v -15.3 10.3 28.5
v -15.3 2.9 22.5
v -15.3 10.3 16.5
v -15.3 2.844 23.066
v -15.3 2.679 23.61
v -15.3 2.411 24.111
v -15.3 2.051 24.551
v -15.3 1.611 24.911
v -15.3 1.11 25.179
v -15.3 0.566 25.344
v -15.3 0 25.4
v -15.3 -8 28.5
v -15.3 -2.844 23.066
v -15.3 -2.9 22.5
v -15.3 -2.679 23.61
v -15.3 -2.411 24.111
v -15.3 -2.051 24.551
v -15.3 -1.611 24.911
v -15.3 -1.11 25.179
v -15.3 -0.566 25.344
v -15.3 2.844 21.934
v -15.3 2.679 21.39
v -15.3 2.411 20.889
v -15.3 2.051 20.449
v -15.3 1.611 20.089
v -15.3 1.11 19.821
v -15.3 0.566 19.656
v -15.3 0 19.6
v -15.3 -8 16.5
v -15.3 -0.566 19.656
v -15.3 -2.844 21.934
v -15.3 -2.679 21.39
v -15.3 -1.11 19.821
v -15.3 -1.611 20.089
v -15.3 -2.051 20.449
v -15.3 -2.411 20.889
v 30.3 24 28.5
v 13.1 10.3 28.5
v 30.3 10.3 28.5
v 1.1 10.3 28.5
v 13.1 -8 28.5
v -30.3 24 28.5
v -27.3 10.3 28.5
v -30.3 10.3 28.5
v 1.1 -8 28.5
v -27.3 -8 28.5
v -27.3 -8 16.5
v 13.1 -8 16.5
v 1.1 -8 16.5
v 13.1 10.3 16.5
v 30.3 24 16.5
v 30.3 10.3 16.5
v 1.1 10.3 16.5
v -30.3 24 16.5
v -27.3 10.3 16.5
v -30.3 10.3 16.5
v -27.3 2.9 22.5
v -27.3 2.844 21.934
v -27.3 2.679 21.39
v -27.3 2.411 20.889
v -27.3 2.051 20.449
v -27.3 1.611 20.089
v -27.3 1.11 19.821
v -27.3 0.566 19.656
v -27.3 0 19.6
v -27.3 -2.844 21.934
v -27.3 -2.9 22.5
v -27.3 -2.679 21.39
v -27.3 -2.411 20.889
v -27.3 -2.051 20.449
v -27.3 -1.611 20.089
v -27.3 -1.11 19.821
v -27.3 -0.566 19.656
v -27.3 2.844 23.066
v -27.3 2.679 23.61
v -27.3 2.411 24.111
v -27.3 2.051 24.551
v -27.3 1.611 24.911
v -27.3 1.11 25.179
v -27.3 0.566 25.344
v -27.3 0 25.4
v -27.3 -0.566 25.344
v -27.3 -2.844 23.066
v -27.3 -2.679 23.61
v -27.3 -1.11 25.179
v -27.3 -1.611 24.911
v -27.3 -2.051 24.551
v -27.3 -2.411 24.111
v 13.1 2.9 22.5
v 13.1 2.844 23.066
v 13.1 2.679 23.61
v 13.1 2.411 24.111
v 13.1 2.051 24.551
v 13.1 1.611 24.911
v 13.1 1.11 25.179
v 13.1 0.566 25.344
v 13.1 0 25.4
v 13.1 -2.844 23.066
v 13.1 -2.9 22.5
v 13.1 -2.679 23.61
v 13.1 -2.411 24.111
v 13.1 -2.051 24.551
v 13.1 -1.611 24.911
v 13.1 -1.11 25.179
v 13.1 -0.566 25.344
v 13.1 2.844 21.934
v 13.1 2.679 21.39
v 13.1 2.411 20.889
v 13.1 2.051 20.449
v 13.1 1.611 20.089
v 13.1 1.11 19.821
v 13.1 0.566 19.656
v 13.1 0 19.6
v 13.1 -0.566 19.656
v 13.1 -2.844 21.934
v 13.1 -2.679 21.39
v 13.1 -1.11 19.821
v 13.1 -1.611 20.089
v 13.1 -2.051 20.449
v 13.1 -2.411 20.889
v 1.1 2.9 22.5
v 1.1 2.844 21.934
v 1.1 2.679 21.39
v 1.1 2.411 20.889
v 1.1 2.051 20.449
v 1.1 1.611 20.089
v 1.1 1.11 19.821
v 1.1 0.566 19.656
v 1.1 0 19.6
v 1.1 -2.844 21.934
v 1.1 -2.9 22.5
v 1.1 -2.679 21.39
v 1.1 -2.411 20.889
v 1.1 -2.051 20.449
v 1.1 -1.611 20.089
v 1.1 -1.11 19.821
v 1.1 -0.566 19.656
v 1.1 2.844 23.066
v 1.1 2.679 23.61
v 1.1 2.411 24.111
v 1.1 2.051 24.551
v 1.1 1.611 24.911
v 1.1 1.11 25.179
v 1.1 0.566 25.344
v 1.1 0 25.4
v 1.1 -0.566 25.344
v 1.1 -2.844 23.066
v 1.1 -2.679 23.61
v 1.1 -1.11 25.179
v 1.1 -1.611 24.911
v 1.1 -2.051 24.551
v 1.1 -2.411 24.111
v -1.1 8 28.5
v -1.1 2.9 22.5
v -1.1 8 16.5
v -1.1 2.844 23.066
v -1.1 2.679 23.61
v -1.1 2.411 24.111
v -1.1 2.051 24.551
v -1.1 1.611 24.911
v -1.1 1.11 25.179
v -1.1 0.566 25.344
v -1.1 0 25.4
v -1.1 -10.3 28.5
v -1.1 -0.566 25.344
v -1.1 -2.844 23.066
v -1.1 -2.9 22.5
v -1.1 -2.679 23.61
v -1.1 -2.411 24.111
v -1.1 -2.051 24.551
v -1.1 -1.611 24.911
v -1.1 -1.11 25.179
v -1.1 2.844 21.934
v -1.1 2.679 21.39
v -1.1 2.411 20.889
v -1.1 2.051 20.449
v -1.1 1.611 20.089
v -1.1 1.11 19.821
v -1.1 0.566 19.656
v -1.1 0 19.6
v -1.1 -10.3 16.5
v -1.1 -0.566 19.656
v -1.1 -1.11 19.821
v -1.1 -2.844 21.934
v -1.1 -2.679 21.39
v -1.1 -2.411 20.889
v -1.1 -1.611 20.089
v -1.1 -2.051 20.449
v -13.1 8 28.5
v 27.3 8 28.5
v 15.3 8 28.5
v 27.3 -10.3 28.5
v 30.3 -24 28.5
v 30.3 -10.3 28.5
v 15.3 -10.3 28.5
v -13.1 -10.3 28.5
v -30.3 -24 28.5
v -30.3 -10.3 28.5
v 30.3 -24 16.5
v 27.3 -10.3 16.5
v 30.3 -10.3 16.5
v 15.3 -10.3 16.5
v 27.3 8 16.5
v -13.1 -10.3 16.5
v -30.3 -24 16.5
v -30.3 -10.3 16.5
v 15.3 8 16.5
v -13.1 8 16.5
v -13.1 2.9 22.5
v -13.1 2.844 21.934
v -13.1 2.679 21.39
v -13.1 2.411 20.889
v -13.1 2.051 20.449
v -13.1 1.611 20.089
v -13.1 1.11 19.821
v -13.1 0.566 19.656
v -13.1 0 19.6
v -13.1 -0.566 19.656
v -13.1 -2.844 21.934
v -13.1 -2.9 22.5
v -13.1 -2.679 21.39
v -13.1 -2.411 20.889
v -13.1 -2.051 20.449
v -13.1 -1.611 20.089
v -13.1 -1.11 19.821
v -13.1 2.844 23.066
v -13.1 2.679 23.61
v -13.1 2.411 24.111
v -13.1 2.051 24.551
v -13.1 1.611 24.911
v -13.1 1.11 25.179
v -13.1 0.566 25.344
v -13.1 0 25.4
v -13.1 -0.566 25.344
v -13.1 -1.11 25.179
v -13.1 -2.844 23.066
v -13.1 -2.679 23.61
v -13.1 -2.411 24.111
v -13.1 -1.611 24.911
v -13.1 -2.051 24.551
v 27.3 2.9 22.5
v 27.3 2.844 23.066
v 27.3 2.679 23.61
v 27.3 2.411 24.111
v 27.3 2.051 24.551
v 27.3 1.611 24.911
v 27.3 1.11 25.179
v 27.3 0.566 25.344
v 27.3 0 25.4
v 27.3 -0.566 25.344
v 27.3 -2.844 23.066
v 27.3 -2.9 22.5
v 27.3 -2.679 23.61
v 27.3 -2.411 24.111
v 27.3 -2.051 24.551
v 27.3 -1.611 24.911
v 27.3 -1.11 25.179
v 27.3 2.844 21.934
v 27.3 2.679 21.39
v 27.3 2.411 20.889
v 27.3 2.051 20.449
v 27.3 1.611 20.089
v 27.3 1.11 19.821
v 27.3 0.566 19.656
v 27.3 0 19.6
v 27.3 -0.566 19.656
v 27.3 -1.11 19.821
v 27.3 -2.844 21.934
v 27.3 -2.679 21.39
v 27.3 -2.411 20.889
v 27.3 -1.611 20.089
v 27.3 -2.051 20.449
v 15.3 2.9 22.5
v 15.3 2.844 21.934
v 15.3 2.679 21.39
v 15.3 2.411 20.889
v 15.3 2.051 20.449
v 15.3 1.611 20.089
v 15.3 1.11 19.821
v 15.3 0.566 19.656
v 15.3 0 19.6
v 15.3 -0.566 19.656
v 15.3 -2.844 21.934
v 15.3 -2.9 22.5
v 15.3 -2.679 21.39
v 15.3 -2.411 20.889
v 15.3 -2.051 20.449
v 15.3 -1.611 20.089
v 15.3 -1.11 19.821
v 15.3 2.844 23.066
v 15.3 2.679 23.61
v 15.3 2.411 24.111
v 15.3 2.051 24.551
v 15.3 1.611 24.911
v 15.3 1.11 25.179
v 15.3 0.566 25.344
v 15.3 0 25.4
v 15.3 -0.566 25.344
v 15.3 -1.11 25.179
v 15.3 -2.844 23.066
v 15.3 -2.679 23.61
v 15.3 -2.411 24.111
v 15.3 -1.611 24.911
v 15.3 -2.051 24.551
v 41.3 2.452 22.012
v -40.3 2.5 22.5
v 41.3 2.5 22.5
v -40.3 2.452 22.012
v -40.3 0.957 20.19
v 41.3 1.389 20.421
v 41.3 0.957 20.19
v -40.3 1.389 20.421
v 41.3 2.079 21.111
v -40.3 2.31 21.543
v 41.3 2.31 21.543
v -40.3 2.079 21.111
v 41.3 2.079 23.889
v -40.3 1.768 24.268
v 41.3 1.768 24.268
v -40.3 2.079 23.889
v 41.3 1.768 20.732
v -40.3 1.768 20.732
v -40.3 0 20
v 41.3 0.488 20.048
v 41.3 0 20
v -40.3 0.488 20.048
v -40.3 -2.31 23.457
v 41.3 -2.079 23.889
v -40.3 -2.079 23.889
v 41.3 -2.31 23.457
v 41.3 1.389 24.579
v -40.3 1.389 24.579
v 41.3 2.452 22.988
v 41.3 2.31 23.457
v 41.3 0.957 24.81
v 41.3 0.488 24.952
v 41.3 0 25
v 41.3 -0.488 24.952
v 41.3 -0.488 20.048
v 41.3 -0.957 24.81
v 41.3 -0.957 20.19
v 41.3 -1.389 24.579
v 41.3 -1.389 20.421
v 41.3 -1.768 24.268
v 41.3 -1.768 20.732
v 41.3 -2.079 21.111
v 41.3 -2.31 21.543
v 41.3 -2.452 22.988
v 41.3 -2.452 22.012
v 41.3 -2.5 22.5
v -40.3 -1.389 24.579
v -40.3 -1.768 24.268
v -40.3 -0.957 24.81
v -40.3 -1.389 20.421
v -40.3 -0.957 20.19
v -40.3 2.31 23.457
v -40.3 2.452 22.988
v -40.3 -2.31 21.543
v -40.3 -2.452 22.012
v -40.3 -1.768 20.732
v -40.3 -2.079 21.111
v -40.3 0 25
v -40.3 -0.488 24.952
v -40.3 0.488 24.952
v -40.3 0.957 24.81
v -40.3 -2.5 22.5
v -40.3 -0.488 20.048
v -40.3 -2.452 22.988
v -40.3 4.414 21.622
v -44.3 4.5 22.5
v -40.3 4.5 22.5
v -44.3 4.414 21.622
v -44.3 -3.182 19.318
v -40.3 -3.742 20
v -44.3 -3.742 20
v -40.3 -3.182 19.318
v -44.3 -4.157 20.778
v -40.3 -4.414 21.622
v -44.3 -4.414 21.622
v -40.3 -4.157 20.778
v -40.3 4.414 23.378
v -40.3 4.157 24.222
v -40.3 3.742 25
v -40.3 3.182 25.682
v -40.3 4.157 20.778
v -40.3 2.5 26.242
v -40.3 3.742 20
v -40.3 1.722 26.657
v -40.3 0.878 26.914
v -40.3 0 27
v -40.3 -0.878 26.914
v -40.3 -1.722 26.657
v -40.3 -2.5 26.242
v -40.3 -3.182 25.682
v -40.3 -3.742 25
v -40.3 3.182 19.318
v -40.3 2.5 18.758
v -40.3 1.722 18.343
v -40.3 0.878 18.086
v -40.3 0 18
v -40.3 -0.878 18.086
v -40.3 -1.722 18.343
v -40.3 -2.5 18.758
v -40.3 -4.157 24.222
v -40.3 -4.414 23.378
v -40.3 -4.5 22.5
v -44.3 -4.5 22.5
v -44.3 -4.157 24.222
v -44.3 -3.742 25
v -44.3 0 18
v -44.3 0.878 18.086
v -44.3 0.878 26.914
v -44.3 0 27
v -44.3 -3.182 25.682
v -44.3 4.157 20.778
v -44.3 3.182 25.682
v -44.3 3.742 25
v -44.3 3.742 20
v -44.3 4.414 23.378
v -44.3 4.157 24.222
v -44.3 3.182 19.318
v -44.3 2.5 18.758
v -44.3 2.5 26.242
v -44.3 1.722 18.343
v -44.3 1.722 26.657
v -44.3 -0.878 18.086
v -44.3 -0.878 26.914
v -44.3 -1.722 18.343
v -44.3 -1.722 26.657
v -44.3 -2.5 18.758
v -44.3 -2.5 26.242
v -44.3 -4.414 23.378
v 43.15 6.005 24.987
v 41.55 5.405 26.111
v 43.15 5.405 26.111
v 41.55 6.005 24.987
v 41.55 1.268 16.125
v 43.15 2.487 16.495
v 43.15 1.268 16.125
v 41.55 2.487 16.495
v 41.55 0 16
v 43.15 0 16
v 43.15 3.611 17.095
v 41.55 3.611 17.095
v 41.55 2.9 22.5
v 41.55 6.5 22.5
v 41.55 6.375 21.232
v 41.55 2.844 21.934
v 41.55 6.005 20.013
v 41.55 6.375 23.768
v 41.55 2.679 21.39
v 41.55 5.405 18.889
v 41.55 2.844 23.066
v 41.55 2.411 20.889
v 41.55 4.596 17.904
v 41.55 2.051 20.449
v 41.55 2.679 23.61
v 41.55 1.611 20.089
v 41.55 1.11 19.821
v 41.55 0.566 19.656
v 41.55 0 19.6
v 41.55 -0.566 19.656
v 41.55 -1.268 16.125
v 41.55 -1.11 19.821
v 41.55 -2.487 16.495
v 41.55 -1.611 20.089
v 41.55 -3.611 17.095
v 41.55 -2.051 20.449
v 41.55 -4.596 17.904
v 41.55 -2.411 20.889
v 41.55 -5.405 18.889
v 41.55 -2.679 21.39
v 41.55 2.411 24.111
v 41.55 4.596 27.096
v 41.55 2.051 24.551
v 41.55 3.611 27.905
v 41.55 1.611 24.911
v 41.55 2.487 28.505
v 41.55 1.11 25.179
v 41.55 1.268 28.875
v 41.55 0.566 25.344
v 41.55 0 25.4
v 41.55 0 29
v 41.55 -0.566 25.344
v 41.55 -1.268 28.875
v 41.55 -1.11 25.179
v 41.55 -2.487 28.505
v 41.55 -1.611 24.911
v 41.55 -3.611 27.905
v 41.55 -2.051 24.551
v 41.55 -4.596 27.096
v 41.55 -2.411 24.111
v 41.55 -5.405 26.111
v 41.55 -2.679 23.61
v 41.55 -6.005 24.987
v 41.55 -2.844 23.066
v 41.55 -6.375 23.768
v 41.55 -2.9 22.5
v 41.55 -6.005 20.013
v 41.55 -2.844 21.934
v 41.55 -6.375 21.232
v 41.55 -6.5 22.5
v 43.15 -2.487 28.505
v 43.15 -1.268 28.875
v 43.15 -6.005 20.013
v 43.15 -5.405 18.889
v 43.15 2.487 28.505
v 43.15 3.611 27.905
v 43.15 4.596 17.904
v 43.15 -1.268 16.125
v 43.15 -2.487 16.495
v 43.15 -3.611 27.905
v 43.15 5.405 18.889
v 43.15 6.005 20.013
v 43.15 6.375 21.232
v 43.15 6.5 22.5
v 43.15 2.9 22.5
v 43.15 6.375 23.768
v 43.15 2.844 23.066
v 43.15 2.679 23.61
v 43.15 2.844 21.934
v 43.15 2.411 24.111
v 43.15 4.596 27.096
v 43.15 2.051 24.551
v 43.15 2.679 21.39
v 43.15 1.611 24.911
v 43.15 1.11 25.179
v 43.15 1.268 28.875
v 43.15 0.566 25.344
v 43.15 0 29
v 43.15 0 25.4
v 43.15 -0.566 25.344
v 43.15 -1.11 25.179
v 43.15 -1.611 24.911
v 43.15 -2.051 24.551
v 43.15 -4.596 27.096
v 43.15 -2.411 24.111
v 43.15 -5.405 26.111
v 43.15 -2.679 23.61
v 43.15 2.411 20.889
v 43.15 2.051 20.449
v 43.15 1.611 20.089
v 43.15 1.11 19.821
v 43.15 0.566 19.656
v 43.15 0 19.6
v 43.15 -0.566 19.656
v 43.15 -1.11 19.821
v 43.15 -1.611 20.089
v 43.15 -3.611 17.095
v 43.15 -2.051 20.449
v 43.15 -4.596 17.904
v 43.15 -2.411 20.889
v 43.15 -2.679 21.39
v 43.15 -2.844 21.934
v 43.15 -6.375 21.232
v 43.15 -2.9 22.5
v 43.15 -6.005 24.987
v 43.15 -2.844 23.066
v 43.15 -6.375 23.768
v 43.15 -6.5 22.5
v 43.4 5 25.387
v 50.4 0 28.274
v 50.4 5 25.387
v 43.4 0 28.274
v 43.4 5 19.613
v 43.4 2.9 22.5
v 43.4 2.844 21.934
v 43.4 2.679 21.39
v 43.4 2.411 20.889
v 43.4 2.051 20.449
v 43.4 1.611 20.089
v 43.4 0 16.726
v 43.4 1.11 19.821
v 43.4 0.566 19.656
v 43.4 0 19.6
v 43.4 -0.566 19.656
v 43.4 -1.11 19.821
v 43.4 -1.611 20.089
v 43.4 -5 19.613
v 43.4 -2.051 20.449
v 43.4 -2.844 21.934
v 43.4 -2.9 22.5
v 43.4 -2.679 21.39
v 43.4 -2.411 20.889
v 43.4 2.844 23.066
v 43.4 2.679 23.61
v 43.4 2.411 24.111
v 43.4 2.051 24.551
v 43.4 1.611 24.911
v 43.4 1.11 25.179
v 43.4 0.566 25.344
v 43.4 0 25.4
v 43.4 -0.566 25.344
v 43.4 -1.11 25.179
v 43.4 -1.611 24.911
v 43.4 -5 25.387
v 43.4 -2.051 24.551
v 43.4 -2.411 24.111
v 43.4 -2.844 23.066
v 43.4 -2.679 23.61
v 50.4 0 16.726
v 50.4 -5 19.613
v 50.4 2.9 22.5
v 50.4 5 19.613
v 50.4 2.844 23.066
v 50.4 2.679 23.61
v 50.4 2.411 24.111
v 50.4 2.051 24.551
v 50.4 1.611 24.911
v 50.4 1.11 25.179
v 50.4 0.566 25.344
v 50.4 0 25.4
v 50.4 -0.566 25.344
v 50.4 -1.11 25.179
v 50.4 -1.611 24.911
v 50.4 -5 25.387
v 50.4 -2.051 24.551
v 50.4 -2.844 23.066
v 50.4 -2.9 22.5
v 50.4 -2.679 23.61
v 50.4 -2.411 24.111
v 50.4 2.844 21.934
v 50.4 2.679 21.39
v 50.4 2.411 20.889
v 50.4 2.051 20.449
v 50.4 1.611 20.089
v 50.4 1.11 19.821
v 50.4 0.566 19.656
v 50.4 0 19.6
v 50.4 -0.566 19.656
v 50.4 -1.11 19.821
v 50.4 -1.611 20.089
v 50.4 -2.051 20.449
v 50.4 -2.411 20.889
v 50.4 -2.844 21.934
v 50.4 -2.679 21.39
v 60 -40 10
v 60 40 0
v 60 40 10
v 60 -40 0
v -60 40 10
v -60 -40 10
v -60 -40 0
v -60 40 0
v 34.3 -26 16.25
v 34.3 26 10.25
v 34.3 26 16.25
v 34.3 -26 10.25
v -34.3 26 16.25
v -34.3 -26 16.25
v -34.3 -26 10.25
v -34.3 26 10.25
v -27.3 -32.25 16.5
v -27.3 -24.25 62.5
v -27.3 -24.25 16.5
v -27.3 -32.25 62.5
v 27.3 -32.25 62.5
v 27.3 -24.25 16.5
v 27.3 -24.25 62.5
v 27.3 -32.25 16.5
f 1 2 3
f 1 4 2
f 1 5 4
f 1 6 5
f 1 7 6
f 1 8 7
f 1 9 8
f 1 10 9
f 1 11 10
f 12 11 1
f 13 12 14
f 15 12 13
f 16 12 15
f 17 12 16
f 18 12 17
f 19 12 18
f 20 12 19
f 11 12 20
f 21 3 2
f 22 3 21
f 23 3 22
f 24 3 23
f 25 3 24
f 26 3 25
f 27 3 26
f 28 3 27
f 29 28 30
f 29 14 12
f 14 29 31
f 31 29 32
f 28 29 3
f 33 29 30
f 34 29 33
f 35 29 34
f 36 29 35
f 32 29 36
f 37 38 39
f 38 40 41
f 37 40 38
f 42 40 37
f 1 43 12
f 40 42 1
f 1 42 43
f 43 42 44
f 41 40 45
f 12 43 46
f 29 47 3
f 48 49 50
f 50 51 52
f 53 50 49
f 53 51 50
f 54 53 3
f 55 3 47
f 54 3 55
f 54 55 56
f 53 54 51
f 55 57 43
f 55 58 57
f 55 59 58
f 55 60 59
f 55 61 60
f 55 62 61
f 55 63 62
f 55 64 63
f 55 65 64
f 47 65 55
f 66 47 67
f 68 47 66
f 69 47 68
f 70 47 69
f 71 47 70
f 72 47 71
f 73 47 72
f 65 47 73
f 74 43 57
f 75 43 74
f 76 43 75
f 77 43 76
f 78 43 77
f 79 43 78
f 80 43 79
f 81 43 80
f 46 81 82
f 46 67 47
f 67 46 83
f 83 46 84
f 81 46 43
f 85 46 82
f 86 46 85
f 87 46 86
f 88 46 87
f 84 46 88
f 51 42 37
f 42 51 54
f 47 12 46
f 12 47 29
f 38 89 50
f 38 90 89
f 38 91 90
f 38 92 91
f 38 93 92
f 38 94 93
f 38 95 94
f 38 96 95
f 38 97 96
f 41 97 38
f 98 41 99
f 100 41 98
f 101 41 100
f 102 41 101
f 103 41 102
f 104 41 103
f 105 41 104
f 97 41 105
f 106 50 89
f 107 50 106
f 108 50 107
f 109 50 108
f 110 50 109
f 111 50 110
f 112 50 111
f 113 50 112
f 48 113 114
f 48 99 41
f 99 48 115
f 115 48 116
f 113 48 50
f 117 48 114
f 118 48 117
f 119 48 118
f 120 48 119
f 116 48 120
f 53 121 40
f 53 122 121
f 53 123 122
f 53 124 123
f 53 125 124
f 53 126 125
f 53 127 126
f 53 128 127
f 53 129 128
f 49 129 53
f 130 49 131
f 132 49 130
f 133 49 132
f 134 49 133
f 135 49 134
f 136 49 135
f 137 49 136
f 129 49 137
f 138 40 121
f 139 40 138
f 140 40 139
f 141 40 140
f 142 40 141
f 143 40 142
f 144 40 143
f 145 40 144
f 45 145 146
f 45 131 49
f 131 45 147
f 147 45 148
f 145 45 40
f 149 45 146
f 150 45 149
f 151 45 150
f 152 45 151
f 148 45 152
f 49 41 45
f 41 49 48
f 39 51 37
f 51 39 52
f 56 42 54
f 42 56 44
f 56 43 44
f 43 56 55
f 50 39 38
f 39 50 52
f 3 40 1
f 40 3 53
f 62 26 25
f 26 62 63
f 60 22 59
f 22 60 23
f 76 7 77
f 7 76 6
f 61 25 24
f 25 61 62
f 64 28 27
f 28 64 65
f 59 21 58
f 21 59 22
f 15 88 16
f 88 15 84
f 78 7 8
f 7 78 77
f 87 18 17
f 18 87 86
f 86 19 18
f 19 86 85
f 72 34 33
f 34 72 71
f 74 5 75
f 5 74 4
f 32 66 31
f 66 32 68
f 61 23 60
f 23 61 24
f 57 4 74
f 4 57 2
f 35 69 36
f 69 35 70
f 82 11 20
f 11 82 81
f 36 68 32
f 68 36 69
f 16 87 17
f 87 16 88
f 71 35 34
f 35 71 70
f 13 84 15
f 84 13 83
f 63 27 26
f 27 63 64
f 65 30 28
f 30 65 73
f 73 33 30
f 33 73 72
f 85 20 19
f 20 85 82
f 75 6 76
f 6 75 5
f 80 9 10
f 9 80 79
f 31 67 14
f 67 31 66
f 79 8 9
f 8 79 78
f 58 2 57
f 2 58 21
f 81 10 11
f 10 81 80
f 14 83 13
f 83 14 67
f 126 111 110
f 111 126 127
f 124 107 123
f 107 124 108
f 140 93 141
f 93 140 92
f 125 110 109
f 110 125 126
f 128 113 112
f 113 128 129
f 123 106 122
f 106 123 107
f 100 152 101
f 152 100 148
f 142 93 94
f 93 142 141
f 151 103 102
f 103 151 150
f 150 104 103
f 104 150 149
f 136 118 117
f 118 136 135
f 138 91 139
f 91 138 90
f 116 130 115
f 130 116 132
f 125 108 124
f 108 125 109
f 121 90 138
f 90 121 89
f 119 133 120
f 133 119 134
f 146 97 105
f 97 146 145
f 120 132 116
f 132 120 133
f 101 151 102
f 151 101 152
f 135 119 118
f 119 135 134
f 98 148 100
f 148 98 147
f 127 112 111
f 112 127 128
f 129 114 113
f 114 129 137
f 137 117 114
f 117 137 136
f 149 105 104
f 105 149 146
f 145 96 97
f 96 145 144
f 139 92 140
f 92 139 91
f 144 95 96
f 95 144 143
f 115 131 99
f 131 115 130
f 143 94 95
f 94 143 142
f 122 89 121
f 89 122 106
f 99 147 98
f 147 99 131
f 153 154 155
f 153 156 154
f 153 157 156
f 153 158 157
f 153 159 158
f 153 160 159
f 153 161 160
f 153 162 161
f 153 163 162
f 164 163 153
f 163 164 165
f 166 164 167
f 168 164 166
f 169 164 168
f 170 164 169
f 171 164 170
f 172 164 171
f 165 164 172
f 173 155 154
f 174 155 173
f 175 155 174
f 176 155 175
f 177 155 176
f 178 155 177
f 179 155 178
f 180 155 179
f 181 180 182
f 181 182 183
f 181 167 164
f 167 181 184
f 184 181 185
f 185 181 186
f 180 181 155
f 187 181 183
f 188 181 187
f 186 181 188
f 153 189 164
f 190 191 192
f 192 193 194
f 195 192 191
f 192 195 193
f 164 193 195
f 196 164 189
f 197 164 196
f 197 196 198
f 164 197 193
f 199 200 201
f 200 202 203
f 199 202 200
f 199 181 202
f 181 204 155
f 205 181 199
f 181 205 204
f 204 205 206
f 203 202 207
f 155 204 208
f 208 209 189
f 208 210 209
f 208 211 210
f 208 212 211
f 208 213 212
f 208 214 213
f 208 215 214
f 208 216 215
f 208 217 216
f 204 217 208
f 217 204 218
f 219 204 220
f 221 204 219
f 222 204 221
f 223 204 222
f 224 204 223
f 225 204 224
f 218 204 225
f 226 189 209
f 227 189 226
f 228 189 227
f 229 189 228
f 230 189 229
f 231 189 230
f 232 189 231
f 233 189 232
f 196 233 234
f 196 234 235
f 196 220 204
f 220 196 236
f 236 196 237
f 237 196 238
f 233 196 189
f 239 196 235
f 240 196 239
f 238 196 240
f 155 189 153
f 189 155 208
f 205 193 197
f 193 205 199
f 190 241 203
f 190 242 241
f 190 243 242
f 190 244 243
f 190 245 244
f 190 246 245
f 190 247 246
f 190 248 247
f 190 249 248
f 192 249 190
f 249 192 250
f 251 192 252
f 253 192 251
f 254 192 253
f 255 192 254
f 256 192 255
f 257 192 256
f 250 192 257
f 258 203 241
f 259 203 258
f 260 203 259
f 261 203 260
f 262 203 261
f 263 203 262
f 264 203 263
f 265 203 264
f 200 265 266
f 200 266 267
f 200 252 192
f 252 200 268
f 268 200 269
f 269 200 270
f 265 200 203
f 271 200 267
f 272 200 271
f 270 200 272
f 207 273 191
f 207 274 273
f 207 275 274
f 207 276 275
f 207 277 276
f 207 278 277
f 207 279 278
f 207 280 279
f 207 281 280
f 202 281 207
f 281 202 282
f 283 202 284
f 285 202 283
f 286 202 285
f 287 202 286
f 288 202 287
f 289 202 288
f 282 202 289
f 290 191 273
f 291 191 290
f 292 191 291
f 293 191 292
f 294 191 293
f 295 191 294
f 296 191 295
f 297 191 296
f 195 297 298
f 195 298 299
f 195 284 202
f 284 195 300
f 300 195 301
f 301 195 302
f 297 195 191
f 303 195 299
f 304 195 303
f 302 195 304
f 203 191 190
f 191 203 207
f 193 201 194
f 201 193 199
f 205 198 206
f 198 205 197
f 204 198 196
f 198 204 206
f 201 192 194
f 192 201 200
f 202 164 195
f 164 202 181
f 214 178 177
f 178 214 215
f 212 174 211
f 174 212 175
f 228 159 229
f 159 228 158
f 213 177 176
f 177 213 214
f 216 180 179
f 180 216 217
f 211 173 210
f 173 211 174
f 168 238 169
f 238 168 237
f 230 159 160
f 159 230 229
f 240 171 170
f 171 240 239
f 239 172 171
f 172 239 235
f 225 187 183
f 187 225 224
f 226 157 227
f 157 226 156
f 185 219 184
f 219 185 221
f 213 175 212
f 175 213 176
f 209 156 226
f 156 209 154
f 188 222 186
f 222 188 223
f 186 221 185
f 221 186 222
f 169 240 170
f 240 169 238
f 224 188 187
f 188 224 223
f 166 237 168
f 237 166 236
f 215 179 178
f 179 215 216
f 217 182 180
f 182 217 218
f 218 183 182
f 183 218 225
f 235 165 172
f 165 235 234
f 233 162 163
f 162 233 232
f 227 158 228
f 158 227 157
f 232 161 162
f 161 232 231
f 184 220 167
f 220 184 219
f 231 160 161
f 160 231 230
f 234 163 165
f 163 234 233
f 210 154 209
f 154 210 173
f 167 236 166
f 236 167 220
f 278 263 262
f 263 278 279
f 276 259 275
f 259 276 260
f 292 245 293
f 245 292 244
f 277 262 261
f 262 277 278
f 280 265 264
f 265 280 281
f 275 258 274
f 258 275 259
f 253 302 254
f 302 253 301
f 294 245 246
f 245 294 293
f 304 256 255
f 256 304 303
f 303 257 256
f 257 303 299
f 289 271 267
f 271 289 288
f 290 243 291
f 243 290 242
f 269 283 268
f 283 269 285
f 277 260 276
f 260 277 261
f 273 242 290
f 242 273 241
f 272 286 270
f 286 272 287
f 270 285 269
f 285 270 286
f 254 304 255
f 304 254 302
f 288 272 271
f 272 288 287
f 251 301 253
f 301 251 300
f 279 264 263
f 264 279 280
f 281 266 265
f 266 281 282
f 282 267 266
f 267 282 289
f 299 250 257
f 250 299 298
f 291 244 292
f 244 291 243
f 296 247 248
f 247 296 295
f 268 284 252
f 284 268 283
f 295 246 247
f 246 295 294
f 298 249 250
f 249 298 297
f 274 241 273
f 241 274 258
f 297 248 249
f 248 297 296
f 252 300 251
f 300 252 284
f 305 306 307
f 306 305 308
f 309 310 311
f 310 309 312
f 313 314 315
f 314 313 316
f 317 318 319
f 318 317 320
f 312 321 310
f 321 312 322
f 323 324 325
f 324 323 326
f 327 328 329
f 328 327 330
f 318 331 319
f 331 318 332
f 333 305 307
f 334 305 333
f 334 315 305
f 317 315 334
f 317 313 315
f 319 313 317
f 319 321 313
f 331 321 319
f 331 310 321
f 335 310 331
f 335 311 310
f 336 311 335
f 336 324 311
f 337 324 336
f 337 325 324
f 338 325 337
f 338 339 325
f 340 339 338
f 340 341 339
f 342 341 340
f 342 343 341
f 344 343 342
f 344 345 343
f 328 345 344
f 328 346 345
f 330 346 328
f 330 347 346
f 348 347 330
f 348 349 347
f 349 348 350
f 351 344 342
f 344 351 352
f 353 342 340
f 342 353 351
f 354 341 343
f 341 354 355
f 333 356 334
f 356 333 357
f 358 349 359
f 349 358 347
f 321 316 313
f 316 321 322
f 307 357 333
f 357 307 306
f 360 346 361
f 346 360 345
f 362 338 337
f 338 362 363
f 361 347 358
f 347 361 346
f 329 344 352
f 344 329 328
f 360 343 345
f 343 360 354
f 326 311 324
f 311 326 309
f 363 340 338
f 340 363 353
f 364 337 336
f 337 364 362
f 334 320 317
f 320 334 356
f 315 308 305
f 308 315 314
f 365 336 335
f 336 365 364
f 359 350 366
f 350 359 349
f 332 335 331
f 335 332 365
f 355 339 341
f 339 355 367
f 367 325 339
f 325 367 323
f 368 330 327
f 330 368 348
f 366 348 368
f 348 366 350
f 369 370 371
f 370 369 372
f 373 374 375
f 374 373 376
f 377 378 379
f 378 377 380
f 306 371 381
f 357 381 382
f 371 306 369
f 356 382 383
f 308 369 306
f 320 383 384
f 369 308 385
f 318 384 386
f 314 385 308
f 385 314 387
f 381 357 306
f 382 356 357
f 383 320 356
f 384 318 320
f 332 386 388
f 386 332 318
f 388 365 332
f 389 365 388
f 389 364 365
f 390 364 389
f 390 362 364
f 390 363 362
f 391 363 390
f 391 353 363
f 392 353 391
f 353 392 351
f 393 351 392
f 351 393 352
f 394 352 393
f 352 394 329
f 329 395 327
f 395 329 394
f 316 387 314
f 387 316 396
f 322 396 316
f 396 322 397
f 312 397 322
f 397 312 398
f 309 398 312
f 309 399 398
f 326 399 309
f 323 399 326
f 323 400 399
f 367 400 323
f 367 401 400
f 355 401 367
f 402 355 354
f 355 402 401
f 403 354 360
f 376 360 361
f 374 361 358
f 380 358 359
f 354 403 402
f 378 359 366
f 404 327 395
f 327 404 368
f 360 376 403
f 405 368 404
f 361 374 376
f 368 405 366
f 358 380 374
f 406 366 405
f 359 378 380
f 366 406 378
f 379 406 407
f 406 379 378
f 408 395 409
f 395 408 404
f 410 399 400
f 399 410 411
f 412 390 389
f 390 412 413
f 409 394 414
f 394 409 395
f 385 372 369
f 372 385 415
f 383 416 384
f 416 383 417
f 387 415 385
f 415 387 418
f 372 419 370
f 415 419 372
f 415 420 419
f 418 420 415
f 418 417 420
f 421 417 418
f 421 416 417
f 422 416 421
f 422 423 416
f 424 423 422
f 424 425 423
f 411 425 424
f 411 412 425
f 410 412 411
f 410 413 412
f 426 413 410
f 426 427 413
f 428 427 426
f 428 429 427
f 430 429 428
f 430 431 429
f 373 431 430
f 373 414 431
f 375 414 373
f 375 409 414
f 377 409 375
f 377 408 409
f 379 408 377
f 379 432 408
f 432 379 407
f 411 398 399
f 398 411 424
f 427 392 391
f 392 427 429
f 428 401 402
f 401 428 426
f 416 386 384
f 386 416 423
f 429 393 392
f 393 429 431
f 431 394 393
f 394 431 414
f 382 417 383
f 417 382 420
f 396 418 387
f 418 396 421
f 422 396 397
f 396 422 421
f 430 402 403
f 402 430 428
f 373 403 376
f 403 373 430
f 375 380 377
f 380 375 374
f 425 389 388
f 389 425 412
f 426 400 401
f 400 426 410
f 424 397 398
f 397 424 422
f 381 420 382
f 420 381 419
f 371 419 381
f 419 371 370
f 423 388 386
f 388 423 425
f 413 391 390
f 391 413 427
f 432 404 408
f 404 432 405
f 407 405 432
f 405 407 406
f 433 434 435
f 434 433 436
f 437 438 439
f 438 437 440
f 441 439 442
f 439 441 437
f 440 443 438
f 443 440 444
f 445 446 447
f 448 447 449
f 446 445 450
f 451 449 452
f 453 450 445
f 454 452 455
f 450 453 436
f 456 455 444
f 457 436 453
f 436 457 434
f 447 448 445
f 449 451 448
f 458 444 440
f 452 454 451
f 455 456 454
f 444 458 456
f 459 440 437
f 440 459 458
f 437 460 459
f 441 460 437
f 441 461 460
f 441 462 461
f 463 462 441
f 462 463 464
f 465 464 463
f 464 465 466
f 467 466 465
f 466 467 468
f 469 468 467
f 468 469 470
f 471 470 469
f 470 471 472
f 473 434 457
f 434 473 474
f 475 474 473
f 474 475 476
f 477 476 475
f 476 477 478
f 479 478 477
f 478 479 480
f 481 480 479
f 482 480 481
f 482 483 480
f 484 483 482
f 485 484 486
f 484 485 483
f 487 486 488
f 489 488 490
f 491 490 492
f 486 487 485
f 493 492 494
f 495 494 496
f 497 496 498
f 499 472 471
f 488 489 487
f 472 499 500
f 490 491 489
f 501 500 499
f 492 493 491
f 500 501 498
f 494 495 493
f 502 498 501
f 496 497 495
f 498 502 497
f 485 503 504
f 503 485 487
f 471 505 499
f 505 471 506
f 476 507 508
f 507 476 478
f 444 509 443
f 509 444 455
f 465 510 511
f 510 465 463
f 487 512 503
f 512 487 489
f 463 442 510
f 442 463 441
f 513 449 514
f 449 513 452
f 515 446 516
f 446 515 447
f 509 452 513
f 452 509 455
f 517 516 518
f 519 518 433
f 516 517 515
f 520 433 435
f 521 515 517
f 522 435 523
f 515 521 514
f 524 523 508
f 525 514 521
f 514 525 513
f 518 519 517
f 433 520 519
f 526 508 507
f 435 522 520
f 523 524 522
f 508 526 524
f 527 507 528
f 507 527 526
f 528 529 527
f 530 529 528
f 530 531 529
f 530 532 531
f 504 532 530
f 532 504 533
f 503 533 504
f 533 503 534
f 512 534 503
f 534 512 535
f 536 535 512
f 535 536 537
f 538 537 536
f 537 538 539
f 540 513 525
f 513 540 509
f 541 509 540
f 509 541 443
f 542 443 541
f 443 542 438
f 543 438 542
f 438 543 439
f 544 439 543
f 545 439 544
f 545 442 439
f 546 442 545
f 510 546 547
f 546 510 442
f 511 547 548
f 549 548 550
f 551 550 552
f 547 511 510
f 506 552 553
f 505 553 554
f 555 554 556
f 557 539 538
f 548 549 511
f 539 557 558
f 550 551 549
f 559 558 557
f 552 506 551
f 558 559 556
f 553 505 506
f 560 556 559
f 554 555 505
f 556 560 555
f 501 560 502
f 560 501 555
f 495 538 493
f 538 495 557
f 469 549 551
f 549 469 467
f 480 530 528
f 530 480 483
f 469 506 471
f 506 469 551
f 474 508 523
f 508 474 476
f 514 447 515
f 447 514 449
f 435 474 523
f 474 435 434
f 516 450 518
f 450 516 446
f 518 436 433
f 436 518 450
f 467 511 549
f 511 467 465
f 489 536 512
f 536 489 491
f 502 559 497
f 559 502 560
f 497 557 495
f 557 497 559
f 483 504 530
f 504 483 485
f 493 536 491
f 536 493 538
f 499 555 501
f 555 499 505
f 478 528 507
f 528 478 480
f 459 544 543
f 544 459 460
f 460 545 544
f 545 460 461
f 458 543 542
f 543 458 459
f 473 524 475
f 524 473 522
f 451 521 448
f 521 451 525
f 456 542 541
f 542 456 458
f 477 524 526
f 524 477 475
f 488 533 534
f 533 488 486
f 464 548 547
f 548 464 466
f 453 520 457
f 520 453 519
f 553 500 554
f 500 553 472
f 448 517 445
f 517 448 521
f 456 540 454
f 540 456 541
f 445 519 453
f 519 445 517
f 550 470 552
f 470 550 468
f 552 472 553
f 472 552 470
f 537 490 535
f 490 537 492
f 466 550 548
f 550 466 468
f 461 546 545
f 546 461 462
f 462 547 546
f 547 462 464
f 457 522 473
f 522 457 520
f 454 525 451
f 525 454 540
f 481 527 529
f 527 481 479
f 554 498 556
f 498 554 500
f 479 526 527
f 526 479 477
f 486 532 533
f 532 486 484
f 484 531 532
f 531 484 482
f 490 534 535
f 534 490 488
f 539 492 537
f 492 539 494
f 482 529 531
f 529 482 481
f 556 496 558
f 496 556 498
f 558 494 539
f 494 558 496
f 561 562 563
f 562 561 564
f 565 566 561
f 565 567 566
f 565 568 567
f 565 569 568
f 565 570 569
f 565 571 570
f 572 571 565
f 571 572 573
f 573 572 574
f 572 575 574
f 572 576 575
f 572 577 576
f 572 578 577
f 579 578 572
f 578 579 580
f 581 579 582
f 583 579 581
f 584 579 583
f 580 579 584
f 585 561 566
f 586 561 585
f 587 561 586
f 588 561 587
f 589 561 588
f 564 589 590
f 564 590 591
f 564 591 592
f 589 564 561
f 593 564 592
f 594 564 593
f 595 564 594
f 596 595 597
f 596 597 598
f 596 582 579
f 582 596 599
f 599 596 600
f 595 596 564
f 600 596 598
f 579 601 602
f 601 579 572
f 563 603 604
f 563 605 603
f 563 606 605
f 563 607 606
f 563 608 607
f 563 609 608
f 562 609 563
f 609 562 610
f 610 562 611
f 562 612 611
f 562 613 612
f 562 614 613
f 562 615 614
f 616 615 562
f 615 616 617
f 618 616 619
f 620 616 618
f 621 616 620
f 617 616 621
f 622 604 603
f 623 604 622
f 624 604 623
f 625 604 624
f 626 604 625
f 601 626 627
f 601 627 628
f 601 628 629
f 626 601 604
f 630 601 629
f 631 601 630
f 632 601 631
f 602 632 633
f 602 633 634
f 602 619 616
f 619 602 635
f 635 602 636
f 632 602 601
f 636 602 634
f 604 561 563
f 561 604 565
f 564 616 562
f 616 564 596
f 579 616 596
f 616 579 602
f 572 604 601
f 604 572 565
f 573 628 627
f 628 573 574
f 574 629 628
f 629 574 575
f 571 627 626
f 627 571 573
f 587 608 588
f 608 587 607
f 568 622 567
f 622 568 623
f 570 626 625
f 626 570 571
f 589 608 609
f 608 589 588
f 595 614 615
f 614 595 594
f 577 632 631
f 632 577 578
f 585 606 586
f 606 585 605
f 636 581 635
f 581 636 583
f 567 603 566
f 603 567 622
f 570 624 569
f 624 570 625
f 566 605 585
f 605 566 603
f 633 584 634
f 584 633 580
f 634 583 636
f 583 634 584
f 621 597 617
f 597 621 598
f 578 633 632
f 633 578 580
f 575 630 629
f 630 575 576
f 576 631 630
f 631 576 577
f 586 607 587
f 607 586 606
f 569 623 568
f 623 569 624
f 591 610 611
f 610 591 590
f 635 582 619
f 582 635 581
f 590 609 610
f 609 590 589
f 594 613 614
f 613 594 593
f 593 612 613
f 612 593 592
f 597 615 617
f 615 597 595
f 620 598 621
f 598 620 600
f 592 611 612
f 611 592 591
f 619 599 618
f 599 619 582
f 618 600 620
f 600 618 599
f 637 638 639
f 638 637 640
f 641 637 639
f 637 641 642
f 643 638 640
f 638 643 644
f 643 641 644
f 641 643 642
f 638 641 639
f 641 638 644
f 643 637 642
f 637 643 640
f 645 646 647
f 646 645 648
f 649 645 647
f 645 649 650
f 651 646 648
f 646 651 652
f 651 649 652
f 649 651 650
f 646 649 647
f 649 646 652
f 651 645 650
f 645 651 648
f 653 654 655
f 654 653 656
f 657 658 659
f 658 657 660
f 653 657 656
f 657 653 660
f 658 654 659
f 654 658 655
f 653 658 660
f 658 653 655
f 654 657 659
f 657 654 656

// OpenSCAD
$fn = 32;

// ------------------------------------------------------------------------
// Comb hinge with flap: leaf 60.6 x 24 mm, pin d5, flap 46 mm
// Every part is its own module, assembly() places every instance.
// ------------------------------------------------------------------------

// --- part 1 ---
module hinge_bed() {
  difference() {
    translate([-60, -40, 0]) cube([120, 80, 10]);
  }
}

// --- part 2 ---
module hinge_riser() {
  difference() {
    translate([-34.3, -26, 0]) cube([68.6, 52, 6]);
  }
}

// --- part 3 ---
module hinge_leaf_a() {
  difference() {
    union() {
      translate([-27.3, -8, -6]) cube([12, 32, 12]);
      translate([1.1, -8, -6]) cube([12, 32, 12]);
      translate([-30.3, 10.3, -6]) cube([60.6, 13.7, 12]);
    }
    translate([-21.3, 0, 0]) rotate([0, 90, 0]) cylinder(h = 14, d = 5.8, center = true);
    translate([7.1, 0, 0]) rotate([0, 90, 0]) cylinder(h = 14, d = 5.8, center = true);
  }
}

// --- part 4 ---
module hinge_leaf_b() {
  difference() {
    union() {
      translate([-13.1, -24, -6]) cube([12, 32, 12]);
      translate([15.3, -24, -6]) cube([12, 32, 12]);
      translate([-30.3, -24, -6]) cube([60.6, 13.7, 12]);
    }
    translate([-7.1, 0, 0]) rotate([0, 90, 0]) cylinder(h = 14, d = 5.8, center = true);
    translate([21.3, 0, 0]) rotate([0, 90, 0]) cylinder(h = 14, d = 5.8, center = true);
  }
}

// --- part 5 ---
module hinge_flap() {
  difference() {
    translate([-27.3, -23, 0]) cube([54.6, 46, 8]);
  }
}

// --- part 6 ---
module hinge_pin() {
  rotate([0, 90, 0]) cylinder(h = 82.6, d = 5, center = true);
  translate([-44.3, 0, 0]) rotate([0, 90, 0]) cylinder(h = 4, d = 9);
}

// --- part 7 ---
module pin_washer() {
  difference() {
      translate([0, 0, 0]) cylinder(h = 1.6, d = 13);
      translate([0, 0, -1]) cylinder(h = 3.6, d = 5.8);
    }
}

// --- part 8 ---
module pin_nut() {
  difference() {
    linear_extrude(height = 7) polygon(points = [[5.774, 0], [2.887, 5], [-2.887, 5], [-5.774, 0], [-2.887, -5], [2.887, -5]]);
    translate([0, 0, -1]) cylinder(h = 9, d = 5.8);
  }
}

// --- assembly ---
module assembly() {
  color([0.80, 0.24, 0.20]) translate([0, 0, 0]) rotate([0, 0, 0]) hinge_bed();
  color([0.20, 0.45, 0.75]) translate([0, 0, 10.25]) rotate([0, 0, 0]) hinge_riser();
  color([0.25, 0.62, 0.32]) translate([0, 0, 22.5]) rotate([0, 0, 0]) hinge_leaf_a();
  color([0.92, 0.70, 0.18]) translate([0, 0, 22.5]) rotate([0, 0, 0]) hinge_leaf_b();
  color([0.58, 0.35, 0.70]) translate([0, -24.25, 39.5]) rotate([90, 0, 0]) hinge_flap();
  color([0.16, 0.66, 0.66]) translate([0, 0, 22.5]) rotate([0, 0, 0]) hinge_pin();
  color([0.85, 0.48, 0.18]) translate([41.55, 0, 22.5]) rotate([0, 90, 0]) pin_washer();
  color([0.55, 0.60, 0.65]) translate([43.4, 0, 22.5]) rotate([0, 90, 0]) pin_nut();
}

assembly();
